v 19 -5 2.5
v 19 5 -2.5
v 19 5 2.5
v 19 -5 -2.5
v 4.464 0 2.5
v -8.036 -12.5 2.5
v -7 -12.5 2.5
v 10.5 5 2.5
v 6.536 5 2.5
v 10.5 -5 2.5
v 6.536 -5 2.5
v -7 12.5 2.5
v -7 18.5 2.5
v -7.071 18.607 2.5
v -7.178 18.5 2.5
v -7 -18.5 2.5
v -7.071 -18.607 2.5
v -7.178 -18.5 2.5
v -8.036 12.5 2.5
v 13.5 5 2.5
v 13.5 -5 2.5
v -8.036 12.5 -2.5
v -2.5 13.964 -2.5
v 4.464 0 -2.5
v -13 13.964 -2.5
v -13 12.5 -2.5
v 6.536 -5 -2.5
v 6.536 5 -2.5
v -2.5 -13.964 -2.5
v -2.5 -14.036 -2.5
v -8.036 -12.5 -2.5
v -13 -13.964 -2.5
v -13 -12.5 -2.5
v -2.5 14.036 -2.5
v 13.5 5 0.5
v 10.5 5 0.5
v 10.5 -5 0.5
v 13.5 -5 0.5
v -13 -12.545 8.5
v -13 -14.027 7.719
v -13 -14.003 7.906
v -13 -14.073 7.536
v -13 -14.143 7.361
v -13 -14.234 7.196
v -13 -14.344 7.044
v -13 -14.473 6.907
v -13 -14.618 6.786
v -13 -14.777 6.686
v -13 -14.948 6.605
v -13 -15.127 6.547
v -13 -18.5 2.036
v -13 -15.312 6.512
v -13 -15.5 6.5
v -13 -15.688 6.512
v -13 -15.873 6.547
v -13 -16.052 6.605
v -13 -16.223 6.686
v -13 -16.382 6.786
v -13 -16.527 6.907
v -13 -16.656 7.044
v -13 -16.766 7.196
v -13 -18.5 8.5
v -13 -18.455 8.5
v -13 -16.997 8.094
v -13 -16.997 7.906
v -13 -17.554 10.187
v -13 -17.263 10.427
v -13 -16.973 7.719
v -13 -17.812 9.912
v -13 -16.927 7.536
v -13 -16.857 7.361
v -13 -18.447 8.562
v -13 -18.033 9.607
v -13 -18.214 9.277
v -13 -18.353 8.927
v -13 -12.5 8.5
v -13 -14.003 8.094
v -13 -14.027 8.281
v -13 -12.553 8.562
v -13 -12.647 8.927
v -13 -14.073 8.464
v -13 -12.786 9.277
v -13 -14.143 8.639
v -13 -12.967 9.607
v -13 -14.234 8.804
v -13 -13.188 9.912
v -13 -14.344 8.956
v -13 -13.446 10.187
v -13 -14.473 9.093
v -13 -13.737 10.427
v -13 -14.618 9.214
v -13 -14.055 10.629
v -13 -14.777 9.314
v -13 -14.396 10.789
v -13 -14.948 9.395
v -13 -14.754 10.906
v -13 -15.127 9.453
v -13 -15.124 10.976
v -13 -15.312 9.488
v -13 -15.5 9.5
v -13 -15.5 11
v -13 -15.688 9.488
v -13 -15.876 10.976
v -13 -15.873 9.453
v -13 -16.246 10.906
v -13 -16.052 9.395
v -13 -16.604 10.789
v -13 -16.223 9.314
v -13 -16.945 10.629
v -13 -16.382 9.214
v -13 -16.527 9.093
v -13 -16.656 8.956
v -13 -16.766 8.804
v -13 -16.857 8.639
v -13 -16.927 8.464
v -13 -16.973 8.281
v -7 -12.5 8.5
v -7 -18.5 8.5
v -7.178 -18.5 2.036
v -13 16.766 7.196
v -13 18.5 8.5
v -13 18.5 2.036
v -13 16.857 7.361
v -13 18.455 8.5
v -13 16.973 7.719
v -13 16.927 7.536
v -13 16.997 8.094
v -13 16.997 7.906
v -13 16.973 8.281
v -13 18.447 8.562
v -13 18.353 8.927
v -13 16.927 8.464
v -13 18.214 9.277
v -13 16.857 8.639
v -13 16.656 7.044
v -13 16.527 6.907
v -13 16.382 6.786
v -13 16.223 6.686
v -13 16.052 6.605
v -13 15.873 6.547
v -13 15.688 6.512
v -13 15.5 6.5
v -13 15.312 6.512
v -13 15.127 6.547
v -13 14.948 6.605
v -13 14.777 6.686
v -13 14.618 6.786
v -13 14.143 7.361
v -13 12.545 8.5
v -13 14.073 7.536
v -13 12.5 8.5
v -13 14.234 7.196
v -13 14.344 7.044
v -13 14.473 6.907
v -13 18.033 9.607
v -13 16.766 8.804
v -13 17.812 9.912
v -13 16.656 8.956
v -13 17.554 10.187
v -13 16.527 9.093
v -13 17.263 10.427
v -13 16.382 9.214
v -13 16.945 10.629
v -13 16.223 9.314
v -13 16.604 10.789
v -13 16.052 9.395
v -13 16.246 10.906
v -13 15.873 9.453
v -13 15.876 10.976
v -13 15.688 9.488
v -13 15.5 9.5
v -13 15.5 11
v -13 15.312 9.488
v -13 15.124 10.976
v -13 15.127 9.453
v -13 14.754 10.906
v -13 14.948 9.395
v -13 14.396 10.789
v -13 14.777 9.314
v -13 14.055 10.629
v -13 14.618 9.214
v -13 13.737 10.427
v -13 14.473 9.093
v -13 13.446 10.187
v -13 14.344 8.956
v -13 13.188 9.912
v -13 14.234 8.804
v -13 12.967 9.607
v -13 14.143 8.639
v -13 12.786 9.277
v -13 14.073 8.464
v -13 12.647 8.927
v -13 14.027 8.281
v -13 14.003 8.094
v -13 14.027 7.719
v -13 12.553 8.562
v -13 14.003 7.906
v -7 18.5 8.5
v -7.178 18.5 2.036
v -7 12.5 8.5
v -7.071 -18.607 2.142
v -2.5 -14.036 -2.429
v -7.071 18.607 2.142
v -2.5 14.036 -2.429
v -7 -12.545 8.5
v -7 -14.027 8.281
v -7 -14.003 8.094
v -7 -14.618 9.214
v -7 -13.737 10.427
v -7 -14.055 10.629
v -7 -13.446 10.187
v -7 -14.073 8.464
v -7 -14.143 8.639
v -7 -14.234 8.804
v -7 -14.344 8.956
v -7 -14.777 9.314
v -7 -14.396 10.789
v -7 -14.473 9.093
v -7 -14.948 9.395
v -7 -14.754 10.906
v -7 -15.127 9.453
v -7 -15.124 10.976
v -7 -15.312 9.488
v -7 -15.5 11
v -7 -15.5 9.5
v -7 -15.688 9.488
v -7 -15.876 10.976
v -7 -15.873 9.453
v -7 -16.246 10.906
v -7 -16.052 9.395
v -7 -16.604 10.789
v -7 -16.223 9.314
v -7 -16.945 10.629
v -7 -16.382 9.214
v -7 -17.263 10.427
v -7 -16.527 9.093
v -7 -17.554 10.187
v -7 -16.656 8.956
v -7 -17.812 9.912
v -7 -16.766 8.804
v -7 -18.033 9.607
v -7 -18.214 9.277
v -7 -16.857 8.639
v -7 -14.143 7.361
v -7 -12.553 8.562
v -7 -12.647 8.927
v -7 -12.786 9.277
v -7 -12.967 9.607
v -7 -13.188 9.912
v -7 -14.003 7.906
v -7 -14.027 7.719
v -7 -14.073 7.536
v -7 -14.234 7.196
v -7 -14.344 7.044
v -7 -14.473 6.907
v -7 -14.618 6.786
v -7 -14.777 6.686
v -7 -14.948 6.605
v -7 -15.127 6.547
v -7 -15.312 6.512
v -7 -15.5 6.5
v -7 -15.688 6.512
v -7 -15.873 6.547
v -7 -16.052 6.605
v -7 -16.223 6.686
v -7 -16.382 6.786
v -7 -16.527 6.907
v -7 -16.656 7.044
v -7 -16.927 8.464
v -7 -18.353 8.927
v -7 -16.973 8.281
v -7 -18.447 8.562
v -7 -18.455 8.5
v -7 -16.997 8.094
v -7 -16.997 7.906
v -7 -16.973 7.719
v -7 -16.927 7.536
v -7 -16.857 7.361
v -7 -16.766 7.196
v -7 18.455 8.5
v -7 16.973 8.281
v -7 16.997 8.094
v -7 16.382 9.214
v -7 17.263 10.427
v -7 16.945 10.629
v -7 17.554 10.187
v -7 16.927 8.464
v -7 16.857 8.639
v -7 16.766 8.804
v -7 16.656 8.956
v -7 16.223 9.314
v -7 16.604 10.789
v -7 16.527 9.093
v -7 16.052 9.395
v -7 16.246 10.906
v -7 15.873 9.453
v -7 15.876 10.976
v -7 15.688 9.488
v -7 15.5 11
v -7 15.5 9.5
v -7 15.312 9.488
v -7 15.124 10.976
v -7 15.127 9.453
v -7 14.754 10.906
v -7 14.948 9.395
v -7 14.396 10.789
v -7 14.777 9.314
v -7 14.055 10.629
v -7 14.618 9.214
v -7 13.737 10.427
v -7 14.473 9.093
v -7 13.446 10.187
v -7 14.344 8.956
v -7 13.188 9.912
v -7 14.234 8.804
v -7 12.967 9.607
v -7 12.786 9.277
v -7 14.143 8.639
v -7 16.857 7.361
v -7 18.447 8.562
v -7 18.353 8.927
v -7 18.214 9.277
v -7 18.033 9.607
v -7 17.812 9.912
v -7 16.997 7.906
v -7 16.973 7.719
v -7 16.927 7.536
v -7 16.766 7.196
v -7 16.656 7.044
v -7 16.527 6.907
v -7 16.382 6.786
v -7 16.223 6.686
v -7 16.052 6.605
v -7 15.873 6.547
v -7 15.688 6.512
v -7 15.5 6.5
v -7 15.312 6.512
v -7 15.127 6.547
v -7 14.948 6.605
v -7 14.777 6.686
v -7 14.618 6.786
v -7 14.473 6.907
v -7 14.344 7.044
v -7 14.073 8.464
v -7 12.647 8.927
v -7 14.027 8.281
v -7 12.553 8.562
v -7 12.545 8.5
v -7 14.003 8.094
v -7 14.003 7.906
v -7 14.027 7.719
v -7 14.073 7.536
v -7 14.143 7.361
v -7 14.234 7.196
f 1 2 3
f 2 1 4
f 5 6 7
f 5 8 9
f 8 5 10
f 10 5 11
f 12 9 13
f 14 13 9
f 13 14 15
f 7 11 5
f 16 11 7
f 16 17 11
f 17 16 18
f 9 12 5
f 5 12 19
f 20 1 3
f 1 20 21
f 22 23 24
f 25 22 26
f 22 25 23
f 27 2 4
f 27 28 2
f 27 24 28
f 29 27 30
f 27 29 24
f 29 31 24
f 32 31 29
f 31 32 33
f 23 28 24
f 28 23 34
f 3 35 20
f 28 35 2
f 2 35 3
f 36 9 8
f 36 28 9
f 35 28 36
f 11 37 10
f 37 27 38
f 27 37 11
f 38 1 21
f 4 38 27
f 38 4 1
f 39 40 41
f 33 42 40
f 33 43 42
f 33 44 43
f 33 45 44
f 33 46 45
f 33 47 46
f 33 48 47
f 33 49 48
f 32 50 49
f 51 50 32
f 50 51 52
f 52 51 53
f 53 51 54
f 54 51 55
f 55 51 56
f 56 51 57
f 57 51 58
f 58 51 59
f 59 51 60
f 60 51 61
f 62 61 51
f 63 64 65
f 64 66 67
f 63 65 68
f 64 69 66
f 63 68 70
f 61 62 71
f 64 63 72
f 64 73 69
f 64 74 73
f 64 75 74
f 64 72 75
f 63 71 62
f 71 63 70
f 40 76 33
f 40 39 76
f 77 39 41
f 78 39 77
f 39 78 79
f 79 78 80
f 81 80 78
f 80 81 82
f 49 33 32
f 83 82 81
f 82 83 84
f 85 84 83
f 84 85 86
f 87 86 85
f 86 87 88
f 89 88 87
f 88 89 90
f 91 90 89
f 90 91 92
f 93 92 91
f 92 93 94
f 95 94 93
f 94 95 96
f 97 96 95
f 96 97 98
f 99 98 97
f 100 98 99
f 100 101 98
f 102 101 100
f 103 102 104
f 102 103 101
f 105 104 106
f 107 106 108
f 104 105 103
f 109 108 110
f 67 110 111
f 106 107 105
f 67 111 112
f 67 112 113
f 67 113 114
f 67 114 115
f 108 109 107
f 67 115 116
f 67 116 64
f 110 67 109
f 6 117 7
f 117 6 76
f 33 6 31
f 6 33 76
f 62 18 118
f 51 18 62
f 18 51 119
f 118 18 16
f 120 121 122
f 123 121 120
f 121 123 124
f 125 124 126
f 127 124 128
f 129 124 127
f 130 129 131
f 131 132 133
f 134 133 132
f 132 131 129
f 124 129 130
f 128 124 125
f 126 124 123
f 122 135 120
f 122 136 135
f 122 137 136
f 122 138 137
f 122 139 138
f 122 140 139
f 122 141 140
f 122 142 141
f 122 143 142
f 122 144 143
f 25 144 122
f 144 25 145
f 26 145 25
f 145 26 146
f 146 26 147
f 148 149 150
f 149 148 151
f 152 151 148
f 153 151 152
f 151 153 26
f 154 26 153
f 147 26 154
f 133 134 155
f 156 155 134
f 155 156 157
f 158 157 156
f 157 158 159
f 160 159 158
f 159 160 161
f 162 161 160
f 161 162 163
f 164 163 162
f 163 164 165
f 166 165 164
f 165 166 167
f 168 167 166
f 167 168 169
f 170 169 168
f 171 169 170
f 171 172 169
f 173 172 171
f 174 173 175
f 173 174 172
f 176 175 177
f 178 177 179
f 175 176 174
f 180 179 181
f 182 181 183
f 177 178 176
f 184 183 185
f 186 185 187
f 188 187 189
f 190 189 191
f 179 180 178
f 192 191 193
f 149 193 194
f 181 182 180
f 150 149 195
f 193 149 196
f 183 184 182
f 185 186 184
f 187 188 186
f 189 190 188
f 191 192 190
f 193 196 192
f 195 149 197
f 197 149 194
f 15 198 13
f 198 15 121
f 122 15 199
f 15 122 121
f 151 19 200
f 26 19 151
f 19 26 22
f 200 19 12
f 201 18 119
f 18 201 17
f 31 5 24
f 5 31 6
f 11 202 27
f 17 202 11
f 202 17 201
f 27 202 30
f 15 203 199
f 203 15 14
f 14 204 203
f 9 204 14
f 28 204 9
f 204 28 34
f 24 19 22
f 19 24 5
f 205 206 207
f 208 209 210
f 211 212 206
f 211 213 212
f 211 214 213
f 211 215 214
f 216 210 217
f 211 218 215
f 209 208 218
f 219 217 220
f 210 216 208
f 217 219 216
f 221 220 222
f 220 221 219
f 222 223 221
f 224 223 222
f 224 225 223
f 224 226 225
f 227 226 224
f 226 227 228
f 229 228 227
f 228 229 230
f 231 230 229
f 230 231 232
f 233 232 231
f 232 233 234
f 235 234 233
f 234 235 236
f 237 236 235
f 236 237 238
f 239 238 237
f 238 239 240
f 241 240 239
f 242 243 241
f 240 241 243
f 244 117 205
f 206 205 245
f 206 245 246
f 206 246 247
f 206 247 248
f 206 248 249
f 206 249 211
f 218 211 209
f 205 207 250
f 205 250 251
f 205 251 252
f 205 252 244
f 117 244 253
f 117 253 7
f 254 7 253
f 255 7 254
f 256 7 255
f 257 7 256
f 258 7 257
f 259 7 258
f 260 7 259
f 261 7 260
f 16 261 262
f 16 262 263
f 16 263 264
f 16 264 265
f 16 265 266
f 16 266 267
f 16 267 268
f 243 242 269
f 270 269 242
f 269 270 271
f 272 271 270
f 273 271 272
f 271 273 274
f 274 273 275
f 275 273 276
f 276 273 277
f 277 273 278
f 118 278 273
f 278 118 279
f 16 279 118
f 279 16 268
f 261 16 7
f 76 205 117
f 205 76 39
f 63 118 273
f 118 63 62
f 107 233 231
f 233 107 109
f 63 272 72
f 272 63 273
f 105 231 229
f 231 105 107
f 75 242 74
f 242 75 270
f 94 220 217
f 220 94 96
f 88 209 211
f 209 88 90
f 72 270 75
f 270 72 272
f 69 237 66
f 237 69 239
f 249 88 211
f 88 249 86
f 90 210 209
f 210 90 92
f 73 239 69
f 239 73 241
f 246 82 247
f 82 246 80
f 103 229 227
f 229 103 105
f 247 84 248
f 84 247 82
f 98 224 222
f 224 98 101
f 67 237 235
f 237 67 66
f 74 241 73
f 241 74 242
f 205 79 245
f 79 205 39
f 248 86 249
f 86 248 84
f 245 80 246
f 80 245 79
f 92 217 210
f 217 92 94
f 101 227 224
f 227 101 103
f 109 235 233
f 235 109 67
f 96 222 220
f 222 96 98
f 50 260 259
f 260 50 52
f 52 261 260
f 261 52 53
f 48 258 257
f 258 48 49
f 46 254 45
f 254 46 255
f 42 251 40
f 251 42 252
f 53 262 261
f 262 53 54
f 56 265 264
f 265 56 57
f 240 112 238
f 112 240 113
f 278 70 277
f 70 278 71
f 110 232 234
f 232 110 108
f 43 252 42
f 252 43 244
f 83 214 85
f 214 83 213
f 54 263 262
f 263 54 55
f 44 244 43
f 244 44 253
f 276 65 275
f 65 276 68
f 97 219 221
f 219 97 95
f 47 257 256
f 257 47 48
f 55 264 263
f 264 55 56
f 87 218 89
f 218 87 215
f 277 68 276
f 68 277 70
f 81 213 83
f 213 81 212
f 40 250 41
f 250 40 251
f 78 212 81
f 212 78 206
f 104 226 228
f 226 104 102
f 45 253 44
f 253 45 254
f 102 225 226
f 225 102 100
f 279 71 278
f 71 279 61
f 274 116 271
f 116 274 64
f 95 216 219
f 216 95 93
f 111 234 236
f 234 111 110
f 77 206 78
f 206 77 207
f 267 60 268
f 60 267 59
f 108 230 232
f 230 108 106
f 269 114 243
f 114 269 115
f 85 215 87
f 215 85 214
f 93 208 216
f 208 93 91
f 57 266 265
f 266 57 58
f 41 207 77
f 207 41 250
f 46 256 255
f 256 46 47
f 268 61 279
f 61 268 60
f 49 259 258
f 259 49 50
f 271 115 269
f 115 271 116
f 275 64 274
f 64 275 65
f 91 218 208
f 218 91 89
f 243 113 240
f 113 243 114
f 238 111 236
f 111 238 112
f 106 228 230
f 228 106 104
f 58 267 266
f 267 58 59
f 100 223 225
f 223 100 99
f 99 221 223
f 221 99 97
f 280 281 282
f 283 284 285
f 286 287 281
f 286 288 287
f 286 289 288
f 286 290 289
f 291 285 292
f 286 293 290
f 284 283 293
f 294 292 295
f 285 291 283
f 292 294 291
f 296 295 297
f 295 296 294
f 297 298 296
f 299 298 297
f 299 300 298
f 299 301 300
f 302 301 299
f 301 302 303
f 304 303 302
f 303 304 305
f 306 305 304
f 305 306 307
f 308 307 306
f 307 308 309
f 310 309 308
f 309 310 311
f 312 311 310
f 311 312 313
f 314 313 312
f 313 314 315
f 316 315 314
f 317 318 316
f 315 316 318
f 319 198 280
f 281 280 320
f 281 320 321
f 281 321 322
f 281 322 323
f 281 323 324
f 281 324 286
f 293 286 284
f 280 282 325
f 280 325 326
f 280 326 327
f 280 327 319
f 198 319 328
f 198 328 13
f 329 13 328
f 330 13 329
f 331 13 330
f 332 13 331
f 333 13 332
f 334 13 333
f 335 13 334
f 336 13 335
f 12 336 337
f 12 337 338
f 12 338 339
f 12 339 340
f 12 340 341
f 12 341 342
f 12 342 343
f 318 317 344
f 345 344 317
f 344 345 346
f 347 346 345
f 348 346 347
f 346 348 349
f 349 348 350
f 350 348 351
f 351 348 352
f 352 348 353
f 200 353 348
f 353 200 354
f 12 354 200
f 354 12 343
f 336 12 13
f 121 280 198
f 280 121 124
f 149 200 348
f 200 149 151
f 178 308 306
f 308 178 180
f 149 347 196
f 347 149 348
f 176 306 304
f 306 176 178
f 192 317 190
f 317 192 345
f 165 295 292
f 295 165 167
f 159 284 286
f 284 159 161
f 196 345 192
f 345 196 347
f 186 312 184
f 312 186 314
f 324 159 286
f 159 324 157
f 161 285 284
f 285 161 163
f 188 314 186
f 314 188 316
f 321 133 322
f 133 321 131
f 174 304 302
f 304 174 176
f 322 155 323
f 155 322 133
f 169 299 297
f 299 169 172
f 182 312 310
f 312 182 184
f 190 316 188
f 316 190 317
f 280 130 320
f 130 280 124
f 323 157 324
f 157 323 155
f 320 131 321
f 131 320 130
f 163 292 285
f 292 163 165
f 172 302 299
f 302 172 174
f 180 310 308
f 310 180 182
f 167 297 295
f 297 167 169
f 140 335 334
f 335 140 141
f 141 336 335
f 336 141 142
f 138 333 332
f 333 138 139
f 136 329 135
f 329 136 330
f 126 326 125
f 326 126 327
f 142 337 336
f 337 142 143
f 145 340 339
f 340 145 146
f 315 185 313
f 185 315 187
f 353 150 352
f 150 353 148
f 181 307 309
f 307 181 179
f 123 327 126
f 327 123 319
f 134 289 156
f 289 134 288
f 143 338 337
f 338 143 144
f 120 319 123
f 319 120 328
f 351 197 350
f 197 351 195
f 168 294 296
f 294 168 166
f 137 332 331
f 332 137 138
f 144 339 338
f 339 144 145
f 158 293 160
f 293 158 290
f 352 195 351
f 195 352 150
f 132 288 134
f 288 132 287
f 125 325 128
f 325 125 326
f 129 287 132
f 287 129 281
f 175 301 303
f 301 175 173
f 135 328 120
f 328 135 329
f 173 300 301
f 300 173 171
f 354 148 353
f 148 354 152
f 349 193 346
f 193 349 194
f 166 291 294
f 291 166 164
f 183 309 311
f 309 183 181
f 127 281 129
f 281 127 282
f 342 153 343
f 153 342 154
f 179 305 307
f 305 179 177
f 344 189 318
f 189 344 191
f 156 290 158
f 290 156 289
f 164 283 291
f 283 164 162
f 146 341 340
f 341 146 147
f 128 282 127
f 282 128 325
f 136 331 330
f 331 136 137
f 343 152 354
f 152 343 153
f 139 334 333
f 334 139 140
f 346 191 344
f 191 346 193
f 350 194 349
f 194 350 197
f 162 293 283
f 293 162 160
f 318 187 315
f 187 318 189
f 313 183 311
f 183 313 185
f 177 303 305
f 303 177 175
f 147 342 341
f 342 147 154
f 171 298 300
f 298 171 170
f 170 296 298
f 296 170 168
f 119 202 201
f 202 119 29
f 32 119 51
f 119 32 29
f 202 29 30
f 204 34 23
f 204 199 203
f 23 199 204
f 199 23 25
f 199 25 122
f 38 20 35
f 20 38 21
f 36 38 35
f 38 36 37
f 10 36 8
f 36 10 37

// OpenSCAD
/*
  Copyright Patrick Koppen
  v1.0 09.08.2016
  GPL3
*/

module boden() {
 translate([12,0,0]) cube([14,10,5],center=true);
 translate([-10,-15.5,0]) cube([6,6,5],center=true);
 translate([-10, 15.5,0]) cube([6,6,5],center=true); 
 translate([0,-8,0]) rotate([0,0,45]) cube([25,5,5], center=true);
 translate([0, 8,0]) rotate([0,0,-45]) cube([25,5,5], center=true);
}

module ecke() {

 difference() {
  union() {
   translate([2.5,0,0]) cube([6,6,6], center=true);
   translate([0,0,0]) cylinder(d=6,h=6,$fn=50, center=true);
  } 
  translate([0,0,0]) cylinder(d=3,h=6,$fn=50, center=true);
 }
}

module body() {
  boden();
  translate([-10,-15.5,8]) rotate([0,90,0]) ecke();
  translate([-10, 15.5,8]) rotate([0,90,0]) ecke();
}

difference() {
 body();
 translate([-10,-20,0]) rotate([ 45,0,0]) cube([15,5,15], center=true);
 translate([-10, 20,0]) rotate([-45,0,0]) cube([15,5,15], center=true);
 
 translate([12,0,1.5]) cube([3,10,2],center=true);

}

%translate([17,0,23]) cube([48,42.3,42.3],center=true);
%translate([17,0,23]) cube([48,31,31],center=true);
